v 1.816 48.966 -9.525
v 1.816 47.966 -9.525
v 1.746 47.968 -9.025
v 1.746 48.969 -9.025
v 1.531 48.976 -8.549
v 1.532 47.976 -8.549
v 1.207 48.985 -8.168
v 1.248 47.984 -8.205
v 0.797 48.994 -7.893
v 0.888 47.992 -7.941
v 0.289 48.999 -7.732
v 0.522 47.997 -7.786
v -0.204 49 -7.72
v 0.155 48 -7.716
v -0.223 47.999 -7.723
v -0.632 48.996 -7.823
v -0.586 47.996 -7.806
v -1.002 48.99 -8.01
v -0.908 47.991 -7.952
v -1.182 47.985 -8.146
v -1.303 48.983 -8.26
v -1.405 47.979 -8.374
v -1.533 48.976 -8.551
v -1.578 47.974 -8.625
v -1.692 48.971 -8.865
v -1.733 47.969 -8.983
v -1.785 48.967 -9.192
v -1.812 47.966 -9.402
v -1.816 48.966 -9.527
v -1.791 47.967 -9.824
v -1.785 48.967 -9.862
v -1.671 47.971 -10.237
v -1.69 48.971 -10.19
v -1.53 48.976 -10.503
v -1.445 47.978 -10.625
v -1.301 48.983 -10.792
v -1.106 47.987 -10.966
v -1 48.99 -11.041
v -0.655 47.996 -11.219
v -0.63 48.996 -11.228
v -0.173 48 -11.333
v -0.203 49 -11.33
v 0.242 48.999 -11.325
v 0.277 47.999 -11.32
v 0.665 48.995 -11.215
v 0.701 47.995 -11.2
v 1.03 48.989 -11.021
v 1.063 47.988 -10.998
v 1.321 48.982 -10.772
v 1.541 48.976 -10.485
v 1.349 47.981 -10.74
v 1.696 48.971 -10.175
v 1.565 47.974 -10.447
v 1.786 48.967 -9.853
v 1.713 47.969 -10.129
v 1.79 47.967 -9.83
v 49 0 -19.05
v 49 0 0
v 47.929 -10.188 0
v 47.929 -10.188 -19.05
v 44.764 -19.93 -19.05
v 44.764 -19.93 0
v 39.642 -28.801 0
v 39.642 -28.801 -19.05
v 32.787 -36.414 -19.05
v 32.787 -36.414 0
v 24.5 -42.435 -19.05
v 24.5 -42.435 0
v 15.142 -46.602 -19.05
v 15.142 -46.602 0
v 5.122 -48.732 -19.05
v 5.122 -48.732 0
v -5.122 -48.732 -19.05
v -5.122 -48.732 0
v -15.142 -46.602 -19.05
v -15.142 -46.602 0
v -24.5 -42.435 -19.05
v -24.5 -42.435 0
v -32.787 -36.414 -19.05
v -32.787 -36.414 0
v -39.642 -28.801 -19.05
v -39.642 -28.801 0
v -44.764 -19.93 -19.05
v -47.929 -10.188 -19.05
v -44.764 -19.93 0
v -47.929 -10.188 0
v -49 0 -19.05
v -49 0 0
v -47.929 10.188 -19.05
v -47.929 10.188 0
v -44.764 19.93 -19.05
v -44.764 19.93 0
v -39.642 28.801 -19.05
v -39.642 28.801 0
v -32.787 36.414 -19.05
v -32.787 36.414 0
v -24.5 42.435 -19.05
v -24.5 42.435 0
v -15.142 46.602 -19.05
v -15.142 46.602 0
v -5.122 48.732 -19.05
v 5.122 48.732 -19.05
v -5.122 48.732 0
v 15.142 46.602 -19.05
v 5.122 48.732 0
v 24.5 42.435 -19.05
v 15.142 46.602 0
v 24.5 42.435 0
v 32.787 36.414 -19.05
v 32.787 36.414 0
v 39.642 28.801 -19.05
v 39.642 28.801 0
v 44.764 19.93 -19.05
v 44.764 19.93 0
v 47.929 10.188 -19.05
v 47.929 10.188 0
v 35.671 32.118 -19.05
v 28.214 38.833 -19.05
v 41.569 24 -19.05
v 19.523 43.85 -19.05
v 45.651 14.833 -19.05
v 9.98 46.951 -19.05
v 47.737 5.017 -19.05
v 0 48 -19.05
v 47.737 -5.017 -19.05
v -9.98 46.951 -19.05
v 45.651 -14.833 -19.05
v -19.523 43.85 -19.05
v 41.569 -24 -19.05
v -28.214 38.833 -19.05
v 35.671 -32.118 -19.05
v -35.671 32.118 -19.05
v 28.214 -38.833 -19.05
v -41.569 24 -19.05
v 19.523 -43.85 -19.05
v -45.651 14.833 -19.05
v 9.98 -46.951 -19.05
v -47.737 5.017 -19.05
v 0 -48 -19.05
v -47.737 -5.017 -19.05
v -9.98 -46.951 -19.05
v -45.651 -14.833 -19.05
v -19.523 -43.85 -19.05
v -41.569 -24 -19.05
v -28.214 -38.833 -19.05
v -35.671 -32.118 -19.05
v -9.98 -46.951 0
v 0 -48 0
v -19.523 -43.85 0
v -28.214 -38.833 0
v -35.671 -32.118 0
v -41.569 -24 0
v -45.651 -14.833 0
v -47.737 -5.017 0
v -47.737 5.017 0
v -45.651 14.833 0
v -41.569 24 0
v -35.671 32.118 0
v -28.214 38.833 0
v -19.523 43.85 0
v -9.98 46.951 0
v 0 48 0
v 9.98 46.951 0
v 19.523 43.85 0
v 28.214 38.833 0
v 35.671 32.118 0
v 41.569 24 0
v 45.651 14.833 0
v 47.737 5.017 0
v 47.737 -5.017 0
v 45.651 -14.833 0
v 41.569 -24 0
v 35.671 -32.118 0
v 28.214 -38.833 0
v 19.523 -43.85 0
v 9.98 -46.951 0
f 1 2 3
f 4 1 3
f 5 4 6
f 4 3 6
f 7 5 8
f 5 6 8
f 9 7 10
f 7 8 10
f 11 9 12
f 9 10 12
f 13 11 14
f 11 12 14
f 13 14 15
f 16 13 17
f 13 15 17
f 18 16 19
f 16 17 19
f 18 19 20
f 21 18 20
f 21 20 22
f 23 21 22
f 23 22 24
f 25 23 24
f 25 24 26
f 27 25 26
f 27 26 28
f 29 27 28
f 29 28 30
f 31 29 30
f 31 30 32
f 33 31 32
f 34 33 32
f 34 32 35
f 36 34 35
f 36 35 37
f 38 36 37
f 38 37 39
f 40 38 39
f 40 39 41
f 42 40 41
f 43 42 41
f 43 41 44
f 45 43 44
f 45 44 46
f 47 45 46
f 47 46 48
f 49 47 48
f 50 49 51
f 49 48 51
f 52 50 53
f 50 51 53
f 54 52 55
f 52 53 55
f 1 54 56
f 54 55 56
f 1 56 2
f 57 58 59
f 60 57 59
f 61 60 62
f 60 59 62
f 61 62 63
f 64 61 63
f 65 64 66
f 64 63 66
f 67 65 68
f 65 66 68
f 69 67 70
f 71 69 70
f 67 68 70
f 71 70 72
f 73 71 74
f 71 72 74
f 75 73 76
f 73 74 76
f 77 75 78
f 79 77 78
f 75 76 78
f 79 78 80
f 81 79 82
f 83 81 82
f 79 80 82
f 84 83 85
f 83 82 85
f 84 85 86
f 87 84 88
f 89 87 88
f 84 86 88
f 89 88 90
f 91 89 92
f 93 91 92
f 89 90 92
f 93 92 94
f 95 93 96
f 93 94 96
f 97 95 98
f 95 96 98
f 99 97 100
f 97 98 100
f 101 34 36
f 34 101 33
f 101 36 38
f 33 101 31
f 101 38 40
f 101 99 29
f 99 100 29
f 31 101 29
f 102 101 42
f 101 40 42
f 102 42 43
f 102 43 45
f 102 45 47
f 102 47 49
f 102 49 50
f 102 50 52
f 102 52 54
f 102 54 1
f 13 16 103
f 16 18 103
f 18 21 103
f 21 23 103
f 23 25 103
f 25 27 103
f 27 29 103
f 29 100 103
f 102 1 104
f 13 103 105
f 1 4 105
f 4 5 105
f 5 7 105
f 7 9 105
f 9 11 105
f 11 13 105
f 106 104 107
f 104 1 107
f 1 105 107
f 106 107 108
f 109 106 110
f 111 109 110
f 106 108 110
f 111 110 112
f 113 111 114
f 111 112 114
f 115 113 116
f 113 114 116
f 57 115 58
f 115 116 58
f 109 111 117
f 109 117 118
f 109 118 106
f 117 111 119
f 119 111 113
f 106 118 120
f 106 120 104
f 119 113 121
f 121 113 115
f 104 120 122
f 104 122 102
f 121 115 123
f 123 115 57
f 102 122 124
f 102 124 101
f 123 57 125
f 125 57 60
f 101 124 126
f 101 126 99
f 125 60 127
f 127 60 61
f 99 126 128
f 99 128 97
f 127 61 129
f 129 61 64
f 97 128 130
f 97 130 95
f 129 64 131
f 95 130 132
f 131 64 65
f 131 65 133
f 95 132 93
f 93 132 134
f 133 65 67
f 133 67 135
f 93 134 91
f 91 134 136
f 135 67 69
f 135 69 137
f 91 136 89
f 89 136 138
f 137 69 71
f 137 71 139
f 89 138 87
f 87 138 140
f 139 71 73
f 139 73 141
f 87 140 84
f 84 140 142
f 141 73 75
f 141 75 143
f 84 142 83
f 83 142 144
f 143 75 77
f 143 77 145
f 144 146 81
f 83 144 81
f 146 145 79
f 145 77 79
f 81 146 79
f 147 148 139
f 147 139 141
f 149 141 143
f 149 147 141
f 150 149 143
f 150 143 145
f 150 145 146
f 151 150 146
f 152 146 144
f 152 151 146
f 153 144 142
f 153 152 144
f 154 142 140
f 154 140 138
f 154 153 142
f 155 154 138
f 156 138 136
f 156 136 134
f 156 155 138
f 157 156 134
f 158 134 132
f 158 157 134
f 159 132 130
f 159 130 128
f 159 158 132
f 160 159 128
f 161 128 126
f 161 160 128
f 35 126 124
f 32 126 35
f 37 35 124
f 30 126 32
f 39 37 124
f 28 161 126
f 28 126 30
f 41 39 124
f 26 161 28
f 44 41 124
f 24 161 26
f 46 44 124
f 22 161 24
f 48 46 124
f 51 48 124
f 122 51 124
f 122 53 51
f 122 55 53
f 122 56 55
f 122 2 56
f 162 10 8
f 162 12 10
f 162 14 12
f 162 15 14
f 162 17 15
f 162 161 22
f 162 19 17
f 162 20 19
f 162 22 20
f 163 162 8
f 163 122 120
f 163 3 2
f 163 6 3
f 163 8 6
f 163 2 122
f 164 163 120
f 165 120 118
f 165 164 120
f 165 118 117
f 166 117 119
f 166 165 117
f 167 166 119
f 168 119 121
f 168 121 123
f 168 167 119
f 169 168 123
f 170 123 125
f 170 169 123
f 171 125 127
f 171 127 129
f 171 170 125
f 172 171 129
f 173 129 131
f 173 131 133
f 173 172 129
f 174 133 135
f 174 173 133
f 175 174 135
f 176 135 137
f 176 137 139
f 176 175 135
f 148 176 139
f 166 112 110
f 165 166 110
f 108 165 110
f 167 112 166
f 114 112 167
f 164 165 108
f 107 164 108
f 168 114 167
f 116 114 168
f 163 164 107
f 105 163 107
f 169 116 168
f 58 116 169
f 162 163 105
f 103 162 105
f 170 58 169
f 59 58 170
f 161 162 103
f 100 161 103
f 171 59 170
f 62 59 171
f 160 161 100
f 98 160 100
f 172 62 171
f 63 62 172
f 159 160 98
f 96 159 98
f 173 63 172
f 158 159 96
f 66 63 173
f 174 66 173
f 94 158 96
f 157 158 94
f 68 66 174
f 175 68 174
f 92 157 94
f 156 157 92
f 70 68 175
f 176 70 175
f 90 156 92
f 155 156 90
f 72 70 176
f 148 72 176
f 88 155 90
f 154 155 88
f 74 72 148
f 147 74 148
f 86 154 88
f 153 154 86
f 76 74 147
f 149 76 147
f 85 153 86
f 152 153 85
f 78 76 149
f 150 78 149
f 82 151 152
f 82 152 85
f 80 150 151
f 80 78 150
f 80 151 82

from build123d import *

# Parameters (mm, degrees)
F0_W     = 49
F0_H     = 19.05
F1_W     = 48
F1_H     = 19.05
F5_D     = 3.6322
F5_DEPTH = 49.001


with BuildPart() as f2:
    # F0 (on Front) → F2 (revolve)
    with BuildSketch(Plane.XZ):
        with Locations((24.5, -9.525)):
            Rectangle(F0_W, F0_H)
    revolve(axis=Axis((0, 0, -9.525), (0, 0, -1)))

    # F1 (on Right) → F3 (revolve, cut)
    with BuildSketch(Plane.YZ):
        with Locations((-24, -9.525)):
            Rectangle(F1_W, F1_H)
    revolve(axis=Axis((0, 0, -9.525), (0, 0, -1)), mode=Mode.SUBTRACT)

    # F5 (through all, one way)
    with BuildSketch(Plane.XZ):
        with Locations((0, -9.525)):
            Circle(F5_D / 2)
    extrude(amount=-F5_DEPTH, mode=Mode.SUBTRACT)


solid = f2.part
